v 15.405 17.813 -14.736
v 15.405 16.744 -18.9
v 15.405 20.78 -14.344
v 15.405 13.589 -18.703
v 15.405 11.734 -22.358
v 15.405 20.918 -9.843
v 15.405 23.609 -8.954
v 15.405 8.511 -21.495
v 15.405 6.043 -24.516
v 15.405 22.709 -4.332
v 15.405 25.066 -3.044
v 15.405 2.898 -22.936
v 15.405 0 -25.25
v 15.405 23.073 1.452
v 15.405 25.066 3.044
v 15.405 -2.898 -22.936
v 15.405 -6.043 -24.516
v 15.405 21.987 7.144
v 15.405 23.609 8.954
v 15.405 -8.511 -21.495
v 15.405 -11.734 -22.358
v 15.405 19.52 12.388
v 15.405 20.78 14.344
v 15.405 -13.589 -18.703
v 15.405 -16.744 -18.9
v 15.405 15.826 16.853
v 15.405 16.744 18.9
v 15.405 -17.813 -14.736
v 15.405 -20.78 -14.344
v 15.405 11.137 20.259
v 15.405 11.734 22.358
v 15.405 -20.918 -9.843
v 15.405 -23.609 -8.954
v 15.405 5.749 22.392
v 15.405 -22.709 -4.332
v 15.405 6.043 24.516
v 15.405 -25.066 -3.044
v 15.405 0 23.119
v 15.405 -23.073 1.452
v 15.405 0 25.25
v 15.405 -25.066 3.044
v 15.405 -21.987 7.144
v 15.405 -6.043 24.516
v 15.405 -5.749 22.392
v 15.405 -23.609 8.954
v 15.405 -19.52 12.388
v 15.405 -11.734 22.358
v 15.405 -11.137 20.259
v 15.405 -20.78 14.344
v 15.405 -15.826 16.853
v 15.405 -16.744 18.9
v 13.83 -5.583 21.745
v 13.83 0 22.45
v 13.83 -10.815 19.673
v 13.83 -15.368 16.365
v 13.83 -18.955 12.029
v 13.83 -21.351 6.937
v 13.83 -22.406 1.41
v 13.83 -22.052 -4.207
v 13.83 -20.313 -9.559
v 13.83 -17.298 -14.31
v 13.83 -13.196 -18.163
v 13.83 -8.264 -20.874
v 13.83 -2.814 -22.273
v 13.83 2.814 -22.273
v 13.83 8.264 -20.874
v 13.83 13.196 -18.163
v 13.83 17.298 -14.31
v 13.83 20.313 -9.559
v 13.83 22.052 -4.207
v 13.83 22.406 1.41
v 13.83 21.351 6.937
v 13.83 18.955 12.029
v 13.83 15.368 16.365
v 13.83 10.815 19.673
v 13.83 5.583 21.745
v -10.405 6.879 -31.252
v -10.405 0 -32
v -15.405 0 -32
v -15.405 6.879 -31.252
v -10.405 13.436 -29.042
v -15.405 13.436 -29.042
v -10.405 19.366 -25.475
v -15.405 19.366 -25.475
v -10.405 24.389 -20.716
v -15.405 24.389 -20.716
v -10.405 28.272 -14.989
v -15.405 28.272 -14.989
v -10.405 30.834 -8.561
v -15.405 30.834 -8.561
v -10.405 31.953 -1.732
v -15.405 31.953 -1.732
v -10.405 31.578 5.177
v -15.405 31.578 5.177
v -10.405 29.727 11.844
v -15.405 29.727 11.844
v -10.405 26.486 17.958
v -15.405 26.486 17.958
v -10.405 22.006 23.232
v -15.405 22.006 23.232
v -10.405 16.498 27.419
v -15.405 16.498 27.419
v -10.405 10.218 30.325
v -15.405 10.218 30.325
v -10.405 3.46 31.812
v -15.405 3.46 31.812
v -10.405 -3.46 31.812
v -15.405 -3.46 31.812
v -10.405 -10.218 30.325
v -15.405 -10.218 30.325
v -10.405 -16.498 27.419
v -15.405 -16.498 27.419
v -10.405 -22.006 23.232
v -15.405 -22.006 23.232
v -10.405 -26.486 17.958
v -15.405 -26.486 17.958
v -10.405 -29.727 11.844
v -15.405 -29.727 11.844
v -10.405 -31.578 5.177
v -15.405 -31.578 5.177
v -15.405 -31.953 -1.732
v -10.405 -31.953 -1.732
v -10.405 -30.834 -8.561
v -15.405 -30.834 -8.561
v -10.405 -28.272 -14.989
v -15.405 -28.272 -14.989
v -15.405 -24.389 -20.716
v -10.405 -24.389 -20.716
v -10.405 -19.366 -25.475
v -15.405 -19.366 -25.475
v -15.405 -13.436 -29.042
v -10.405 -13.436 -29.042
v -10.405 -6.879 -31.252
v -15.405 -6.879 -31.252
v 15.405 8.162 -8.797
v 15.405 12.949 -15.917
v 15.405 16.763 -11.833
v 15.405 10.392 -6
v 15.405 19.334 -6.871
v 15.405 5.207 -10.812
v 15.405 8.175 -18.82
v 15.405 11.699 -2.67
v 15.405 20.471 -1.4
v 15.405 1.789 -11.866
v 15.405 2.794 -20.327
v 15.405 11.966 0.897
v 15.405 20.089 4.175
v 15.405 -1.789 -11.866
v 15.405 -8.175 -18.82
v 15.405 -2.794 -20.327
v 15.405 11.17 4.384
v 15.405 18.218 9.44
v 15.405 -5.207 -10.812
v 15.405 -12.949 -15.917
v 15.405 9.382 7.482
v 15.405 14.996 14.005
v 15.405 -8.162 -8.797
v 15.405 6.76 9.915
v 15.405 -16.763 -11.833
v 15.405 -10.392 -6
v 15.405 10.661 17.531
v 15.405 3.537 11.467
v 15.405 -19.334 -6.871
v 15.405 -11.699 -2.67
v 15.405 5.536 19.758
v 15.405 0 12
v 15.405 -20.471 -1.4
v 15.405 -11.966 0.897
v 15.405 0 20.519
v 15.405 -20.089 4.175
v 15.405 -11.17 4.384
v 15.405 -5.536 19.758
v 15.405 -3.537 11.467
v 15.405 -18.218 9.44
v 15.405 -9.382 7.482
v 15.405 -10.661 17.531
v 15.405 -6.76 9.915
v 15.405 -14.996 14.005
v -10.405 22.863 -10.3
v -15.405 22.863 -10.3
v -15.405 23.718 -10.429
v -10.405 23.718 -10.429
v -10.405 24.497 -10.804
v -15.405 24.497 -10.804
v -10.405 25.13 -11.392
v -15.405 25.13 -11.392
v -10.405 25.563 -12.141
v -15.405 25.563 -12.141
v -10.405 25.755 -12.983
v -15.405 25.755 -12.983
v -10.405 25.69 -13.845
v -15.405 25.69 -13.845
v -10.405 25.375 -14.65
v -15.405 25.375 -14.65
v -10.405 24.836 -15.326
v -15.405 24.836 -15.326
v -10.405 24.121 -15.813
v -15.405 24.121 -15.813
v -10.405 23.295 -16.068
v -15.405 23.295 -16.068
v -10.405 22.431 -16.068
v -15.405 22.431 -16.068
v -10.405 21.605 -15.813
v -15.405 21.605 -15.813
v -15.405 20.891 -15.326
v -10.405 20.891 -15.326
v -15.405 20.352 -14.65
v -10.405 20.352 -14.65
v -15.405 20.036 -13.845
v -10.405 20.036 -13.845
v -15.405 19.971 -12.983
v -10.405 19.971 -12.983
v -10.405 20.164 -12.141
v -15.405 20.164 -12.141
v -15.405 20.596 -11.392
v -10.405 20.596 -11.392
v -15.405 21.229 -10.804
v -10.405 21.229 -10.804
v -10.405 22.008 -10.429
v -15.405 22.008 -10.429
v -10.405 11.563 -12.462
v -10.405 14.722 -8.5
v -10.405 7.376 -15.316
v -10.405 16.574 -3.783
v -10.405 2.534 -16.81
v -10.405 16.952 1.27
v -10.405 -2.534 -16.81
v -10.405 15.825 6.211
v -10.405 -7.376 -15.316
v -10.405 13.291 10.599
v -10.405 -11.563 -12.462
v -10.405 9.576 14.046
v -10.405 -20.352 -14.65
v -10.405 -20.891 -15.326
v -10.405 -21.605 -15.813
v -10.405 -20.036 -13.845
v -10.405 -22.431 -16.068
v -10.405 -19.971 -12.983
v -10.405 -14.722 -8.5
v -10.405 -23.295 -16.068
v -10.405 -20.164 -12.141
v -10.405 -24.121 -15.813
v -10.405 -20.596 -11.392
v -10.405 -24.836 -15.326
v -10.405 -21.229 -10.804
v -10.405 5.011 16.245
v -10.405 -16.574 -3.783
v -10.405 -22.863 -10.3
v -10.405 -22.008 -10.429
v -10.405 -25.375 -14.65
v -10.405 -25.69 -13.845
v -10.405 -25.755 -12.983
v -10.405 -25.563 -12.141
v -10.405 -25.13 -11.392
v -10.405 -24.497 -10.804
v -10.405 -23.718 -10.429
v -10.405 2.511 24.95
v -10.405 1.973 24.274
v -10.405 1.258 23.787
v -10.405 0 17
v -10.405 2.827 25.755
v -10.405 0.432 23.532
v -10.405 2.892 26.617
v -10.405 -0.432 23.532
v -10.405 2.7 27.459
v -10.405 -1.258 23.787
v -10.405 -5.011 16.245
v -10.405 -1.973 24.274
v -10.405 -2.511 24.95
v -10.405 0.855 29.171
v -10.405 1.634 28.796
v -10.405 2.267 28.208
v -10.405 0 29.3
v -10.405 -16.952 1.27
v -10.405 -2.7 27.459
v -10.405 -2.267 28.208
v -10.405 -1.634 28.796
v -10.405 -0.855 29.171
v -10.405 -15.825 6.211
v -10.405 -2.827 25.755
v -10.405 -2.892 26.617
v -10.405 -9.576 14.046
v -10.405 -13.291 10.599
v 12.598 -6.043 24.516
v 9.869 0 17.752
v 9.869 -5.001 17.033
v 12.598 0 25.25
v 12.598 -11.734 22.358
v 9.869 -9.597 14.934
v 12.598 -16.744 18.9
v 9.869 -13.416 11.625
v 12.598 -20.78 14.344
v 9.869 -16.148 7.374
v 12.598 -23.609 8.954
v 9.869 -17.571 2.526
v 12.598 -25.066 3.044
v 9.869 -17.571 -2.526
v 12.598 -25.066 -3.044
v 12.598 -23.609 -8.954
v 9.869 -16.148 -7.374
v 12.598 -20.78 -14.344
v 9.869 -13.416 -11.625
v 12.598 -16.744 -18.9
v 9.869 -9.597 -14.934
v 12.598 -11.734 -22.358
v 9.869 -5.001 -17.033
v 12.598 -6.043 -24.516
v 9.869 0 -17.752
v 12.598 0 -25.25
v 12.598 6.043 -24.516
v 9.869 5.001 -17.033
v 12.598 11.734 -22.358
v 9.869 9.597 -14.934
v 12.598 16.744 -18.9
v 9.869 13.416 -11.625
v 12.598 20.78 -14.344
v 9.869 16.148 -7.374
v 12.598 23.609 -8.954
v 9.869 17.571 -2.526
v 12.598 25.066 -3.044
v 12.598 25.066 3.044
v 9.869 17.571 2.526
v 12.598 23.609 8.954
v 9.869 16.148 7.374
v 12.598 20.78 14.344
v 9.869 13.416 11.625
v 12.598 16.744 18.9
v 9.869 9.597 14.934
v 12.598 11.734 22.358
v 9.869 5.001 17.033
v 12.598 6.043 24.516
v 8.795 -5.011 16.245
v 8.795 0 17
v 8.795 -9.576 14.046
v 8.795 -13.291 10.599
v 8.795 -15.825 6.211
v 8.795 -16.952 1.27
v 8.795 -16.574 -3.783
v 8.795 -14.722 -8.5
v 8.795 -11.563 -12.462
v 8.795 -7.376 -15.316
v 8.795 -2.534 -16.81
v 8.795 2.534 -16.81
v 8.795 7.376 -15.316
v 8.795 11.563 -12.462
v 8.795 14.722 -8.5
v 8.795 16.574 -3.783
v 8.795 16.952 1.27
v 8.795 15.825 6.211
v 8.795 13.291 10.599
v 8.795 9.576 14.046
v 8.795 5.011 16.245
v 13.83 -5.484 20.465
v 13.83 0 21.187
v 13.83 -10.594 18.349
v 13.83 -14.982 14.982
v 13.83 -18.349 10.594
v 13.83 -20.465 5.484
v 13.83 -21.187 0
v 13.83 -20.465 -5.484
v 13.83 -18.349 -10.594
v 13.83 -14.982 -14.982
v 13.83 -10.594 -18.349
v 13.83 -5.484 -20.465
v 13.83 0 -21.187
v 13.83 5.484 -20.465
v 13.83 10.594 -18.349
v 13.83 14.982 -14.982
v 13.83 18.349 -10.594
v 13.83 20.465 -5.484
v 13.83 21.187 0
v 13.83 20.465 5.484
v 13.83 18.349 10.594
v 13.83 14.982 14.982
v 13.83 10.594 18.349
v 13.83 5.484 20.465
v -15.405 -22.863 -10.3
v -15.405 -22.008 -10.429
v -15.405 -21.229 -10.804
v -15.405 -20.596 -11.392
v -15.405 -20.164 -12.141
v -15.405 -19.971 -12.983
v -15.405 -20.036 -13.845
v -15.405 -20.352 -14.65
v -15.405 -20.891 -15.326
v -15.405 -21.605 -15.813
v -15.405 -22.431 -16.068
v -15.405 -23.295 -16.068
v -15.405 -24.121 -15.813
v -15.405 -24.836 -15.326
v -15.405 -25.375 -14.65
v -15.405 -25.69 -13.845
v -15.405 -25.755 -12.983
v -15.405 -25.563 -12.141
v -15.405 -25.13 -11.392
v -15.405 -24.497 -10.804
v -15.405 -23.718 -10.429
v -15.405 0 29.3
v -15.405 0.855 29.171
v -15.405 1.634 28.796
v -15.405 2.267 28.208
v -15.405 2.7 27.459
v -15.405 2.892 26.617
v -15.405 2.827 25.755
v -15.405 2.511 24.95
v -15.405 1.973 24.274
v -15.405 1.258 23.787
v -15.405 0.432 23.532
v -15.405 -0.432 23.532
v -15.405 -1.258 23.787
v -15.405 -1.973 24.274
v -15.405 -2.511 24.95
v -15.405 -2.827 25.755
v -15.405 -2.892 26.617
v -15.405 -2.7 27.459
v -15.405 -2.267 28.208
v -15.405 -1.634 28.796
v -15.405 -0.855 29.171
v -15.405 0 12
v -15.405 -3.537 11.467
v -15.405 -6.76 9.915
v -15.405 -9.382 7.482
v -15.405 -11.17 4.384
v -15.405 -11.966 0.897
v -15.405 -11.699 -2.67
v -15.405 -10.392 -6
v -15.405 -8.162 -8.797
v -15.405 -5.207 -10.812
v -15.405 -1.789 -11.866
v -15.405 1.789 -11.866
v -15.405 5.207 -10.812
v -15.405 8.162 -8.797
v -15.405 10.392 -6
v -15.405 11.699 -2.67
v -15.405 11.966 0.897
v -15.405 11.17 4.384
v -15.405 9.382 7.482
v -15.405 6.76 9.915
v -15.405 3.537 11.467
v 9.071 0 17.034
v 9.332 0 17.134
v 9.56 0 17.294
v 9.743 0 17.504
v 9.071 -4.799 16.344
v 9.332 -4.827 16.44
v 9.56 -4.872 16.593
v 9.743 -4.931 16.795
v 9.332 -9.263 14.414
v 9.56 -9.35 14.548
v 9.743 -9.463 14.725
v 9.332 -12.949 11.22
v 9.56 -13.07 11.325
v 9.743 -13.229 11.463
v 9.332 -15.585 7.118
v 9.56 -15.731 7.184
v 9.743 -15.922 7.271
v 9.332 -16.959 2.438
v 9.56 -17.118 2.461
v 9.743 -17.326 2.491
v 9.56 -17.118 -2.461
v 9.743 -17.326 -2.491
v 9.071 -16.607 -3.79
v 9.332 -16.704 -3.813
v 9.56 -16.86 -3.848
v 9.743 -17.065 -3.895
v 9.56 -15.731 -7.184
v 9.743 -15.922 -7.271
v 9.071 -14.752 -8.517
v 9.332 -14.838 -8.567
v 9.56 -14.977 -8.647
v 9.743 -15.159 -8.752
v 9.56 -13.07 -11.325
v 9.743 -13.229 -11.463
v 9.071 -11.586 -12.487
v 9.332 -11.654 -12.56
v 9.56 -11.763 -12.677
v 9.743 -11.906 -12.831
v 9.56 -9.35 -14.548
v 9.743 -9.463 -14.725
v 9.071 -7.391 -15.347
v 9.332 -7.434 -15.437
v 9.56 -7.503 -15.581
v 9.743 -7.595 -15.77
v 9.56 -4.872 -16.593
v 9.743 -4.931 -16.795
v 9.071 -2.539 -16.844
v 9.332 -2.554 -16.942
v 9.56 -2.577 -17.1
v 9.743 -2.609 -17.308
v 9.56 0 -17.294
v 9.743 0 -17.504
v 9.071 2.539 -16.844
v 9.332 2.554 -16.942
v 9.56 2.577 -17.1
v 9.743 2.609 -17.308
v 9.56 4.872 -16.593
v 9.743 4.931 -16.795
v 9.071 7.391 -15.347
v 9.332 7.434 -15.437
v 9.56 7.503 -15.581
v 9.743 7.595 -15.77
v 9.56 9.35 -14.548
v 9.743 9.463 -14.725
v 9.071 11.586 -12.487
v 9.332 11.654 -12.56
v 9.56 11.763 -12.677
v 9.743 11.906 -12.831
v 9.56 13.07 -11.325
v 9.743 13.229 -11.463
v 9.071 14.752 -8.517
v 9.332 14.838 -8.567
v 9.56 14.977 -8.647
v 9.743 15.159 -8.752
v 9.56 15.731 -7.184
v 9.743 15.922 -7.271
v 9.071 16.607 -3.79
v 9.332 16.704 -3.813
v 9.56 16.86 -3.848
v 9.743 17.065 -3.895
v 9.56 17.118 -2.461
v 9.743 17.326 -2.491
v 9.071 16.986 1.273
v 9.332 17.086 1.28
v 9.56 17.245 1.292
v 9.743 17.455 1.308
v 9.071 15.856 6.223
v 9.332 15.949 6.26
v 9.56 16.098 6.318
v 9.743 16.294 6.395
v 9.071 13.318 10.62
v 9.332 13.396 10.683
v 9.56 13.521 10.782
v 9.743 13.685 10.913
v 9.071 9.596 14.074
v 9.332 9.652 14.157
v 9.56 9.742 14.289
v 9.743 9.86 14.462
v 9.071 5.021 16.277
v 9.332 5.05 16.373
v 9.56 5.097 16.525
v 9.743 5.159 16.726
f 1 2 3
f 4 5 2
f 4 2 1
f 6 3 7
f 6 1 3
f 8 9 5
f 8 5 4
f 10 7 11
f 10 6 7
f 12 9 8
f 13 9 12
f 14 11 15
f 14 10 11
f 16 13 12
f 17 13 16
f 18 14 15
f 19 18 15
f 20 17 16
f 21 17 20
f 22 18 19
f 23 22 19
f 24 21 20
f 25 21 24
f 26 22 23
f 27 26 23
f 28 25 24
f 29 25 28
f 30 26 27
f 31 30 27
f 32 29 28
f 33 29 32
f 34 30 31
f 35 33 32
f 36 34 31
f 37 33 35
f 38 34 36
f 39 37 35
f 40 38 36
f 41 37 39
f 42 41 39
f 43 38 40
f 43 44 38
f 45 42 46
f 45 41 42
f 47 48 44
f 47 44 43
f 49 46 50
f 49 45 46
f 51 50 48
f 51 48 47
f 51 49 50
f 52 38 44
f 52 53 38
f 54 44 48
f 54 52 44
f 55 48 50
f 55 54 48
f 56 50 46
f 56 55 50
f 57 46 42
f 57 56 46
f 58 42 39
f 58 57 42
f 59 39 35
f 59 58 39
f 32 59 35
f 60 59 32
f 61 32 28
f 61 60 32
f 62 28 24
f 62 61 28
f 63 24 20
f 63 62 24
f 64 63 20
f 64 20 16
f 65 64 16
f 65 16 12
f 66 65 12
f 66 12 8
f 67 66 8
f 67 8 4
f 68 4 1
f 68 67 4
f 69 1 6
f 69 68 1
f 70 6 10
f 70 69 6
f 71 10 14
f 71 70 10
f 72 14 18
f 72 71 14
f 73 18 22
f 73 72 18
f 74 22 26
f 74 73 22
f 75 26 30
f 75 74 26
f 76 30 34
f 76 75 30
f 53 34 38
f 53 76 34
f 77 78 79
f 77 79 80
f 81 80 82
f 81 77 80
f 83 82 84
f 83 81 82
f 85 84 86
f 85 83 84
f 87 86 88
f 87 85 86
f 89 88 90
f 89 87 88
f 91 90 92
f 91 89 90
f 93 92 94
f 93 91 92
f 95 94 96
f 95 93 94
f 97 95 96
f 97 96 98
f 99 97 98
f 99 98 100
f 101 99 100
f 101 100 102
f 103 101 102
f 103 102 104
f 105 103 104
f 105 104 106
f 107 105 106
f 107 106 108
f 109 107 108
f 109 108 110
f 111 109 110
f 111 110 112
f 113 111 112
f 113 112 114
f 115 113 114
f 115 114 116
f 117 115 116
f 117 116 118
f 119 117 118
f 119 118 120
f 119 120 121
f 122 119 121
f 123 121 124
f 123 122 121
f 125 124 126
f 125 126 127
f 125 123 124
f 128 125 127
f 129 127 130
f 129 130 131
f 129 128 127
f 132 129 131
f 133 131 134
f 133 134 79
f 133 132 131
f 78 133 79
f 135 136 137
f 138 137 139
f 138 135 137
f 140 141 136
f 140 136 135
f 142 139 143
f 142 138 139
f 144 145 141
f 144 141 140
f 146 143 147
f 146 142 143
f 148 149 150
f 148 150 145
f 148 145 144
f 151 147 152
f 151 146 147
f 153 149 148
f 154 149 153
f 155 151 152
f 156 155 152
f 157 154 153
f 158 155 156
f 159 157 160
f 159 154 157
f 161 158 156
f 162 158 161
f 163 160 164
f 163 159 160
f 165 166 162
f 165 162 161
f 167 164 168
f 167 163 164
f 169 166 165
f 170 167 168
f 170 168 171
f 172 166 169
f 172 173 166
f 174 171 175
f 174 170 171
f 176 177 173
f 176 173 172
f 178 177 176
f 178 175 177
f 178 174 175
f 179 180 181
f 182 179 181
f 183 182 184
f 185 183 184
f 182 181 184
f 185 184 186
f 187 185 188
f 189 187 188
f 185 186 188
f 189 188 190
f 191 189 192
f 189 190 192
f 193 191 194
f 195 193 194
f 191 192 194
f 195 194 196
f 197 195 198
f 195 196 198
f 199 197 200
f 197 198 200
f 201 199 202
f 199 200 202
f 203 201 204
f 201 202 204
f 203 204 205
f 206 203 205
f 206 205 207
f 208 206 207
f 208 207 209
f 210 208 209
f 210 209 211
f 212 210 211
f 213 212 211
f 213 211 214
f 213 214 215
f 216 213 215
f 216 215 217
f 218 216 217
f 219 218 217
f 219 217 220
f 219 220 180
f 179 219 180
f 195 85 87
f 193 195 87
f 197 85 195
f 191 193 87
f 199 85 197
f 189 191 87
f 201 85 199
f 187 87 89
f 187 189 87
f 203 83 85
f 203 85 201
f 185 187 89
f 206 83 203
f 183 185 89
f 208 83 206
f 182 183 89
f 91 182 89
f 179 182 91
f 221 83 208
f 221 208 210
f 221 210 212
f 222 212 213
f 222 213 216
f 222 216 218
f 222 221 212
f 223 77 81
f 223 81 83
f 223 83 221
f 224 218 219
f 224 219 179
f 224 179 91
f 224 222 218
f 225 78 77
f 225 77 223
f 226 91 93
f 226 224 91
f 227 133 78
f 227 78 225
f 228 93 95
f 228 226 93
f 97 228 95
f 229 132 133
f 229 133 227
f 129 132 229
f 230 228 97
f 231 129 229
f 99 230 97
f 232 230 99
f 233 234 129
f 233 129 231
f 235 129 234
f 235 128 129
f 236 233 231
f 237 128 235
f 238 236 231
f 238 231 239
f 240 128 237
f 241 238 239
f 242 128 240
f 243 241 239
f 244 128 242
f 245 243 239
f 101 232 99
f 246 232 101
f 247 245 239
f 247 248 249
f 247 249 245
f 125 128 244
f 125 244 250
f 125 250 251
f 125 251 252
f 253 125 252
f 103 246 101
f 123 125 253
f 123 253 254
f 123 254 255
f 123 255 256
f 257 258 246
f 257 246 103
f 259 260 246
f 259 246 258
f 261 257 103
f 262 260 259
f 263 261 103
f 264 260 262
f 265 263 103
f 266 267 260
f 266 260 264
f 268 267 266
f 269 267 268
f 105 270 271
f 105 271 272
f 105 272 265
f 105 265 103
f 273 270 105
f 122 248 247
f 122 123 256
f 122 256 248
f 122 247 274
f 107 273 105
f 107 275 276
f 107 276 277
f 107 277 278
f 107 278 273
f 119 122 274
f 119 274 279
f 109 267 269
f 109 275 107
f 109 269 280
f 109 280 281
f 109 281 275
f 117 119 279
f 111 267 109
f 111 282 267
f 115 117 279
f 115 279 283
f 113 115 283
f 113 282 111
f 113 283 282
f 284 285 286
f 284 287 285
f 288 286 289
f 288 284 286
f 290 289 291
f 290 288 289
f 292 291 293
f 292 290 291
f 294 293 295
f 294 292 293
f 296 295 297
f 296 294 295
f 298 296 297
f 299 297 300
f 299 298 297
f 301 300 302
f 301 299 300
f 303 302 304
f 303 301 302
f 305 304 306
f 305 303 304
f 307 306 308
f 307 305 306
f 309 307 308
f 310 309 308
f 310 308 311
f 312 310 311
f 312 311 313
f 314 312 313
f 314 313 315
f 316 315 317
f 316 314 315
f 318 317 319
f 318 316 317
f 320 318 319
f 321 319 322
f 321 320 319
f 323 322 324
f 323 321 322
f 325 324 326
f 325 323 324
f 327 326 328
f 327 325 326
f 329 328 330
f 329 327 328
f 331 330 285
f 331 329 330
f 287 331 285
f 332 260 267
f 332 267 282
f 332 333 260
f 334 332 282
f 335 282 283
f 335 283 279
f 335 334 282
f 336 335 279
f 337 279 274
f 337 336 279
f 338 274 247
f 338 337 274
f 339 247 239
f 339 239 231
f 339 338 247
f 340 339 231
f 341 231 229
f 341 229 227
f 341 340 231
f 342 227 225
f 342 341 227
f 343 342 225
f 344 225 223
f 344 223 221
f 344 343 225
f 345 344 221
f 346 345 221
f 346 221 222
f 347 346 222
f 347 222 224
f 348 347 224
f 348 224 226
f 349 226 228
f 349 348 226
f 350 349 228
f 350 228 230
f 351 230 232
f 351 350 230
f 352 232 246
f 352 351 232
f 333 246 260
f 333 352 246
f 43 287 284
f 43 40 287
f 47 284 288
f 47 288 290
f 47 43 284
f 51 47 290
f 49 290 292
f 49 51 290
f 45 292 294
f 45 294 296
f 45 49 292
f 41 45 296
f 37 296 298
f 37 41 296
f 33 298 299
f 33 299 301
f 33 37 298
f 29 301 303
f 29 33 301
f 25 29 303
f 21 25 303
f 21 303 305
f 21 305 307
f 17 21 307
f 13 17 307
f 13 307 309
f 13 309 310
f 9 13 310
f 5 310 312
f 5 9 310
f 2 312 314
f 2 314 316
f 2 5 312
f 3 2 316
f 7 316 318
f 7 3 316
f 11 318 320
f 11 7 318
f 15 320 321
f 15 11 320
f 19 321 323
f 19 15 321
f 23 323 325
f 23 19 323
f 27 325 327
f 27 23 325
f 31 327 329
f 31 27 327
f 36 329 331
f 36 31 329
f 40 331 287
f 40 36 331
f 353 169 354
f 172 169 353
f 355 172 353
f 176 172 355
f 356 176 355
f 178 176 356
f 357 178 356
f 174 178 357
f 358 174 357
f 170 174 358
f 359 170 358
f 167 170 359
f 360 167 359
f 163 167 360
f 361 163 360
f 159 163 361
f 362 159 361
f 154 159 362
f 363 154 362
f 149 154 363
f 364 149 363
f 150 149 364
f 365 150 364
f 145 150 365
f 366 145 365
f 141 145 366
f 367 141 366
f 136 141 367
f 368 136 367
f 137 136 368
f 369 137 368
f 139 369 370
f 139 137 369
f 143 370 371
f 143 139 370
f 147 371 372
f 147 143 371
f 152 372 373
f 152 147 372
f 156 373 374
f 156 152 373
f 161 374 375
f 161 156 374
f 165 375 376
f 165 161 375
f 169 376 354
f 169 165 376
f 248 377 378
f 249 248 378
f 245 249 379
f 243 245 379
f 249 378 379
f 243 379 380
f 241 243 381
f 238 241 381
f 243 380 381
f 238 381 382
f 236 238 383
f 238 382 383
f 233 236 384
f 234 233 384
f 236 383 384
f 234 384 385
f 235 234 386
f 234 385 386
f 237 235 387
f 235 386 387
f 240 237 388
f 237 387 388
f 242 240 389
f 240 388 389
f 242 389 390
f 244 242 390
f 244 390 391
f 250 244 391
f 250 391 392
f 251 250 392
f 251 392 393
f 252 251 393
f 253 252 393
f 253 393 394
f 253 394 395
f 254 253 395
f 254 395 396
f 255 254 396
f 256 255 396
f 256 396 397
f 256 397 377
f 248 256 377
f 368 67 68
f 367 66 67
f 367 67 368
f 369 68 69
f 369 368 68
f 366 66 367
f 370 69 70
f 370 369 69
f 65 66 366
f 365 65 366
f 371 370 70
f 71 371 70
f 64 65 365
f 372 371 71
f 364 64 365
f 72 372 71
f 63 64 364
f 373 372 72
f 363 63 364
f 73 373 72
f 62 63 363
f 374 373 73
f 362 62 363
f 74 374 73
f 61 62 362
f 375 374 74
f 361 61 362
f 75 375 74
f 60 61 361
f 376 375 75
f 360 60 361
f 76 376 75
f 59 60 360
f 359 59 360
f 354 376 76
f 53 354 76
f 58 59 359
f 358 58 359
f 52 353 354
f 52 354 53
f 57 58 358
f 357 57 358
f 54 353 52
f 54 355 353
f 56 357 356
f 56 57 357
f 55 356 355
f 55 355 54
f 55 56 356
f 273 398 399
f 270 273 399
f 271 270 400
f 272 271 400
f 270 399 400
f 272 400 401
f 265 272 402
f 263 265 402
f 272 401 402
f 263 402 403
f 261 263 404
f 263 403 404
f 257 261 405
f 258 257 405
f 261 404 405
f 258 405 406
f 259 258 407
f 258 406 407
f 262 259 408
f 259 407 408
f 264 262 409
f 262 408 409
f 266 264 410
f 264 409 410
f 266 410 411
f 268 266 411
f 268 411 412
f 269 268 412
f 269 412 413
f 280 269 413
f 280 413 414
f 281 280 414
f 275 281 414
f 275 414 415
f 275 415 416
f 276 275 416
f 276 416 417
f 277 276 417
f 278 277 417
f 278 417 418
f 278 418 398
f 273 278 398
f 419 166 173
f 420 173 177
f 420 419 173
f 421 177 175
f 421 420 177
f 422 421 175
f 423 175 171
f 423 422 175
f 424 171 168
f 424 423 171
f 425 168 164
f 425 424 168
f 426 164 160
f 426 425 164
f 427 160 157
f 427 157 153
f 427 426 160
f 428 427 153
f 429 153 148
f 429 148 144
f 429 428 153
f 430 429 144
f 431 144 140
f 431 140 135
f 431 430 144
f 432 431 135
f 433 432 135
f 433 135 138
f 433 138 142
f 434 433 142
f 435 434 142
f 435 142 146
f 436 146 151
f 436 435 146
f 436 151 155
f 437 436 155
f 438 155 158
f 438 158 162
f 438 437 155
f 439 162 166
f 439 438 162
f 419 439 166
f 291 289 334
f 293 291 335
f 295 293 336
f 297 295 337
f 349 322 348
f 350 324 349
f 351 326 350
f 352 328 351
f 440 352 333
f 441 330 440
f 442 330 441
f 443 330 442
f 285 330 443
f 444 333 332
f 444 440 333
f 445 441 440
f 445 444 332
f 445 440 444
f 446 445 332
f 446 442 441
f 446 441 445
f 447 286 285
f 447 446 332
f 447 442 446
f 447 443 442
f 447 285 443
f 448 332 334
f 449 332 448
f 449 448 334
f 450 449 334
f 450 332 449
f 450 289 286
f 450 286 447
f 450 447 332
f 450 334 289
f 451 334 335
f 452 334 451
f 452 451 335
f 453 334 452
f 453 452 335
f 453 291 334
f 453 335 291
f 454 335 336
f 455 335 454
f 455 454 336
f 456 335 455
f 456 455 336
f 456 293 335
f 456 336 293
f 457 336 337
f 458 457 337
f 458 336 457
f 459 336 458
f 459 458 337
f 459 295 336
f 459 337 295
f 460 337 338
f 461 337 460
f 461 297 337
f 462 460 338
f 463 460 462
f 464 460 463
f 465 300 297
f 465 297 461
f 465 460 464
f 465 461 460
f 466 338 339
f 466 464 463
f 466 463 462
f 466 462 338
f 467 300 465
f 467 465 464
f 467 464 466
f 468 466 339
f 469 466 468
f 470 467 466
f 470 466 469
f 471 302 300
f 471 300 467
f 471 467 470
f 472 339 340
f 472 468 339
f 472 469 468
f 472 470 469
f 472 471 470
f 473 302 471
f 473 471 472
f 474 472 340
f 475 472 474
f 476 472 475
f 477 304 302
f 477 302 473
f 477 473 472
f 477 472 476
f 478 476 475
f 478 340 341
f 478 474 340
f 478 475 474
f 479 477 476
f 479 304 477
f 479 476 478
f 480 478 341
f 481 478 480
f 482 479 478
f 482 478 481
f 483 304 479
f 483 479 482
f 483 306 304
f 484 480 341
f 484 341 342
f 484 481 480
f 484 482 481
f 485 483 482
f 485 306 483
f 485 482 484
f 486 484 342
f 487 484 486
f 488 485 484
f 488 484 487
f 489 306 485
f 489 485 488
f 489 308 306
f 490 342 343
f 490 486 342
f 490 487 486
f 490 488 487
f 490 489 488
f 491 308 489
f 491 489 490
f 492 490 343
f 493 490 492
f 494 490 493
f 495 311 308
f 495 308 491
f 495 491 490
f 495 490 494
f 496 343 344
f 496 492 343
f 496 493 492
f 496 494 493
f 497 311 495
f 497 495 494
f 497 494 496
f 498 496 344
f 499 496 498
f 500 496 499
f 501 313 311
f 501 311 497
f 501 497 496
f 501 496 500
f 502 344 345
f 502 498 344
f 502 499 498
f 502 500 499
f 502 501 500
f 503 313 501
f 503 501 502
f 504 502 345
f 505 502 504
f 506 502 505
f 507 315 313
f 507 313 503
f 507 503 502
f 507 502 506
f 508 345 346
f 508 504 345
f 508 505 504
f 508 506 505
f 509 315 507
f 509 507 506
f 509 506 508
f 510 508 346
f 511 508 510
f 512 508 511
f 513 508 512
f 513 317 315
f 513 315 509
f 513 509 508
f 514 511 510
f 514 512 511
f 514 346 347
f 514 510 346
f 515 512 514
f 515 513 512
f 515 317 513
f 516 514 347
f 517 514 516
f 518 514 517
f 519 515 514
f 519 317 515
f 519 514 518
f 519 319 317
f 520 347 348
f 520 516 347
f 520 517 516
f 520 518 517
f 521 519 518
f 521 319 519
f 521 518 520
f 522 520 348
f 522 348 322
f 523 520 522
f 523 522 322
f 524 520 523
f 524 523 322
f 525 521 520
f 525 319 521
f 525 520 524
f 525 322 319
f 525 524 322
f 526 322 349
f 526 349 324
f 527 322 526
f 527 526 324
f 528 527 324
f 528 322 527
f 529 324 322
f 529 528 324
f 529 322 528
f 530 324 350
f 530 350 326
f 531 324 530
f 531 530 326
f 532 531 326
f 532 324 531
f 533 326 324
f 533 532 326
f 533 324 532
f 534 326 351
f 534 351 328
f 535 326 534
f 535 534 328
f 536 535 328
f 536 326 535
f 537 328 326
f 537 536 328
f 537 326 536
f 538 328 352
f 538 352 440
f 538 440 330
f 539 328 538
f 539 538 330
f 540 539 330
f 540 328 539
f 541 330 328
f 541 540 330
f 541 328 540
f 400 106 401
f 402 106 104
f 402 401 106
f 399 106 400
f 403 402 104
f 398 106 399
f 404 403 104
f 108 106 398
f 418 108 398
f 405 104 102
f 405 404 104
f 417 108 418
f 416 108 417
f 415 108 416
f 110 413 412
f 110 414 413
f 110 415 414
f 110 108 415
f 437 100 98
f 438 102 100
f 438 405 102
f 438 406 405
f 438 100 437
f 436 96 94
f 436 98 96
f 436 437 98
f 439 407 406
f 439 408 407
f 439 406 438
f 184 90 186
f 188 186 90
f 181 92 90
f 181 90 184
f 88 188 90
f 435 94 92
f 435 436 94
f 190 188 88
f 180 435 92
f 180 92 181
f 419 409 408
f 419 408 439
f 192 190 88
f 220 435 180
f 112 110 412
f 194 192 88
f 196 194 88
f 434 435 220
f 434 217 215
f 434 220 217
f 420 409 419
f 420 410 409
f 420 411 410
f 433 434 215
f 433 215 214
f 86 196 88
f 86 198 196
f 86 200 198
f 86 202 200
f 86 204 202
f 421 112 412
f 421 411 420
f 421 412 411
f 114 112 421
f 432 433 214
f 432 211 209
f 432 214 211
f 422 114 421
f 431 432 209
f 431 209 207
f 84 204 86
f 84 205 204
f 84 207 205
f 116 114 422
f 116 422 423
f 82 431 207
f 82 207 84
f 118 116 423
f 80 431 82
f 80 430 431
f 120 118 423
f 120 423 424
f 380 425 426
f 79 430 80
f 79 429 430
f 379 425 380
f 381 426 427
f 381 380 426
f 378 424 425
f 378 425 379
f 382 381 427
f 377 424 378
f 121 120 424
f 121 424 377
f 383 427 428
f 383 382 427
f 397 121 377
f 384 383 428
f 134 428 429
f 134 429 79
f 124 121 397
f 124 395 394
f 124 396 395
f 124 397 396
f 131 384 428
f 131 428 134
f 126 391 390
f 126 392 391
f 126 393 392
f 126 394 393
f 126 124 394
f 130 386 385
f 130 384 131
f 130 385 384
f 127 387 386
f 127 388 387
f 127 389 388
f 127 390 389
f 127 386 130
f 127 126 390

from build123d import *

# Parameters (mm, degrees)
M5_CLEARANCE_HOLE1_REACH  = 59.107
M5_CLEARANCE_HOLE1_BORE_R = 2.9
SKETCH5_R                 = 42
SKETCH5_R_2               = 32
CUT_EXTRUDE_THIN1_DEPTH   = 55.572226802


with BuildPart() as part:
    # Sketch1 → Revolve1 (revolve)
    with BuildSketch(Plane.XY, mode=Mode.PRIVATE) as revolve1_sk:
        with BuildLine():
            Line((-15.404727216, 12), (-15.404727216, 34))
            Line((-15.404727216, 34), (-10.404727216, 34))
            Line((-10.404727216, 34), (-10.404727216, 17))
            Line((-10.404727216, 17), (8.794935567, 17))
            ThreePointArc((8.794935567, 17), (9.450533434, 17.206709213), (9.869004233, 17.752070976))
            Line((9.869004233, 17.752070976), (12.598027216, 25.25))
            Line((12.598027216, 25.25), (15.404727216, 25.25))
            Line((15.404727216, 25.25), (15.404727216, 23.1186))
            Line((15.404727216, 23.1186), (13.829927216, 22.450137059))
            Line((13.829927216, 22.450137059), (13.829927216, 21.187062941))
            Line((13.829927216, 21.187062941), (15.404727216, 20.5186))
            Line((15.404727216, 20.5186), (15.404727216, 12))
            Line((15.404727216, 12), (-15.404727216, 12))
        make_face()
    revolve(revolve1_sk.sketch.rotate(Axis((0, 0, 0), (1, 0, 0)), 90), axis=Axis((0, 0, 0), (1, 0, 0)))

    # M5 Clearance Hole1 bore → M5 Clearance Hole1 (cut, up to next)
    with BuildSketch(Plane.ZY.offset(15.404727216), mode=Mode.PRIVATE) as m5_clearance_hole1_sk1:
        with Locations((-13.199999999, -22.86307066)):
            Circle(M5_CLEARANCE_HOLE1_BORE_R)
    m5_clearance_hole1_tool1 = extrude(m5_clearance_hole1_sk1.sketch, amount=-M5_CLEARANCE_HOLE1_REACH, mode=Mode.PRIVATE) & part.part
    # M5 Clearance Hole1 bore → M5 Clearance Hole1 (cut, up to next)
    with BuildSketch(Plane.ZY.offset(15.404727216), mode=Mode.PRIVATE) as m5_clearance_hole1_sk2:
        with Locations((-13.200000001, 22.863070659)):
            Circle(M5_CLEARANCE_HOLE1_BORE_R)
    m5_clearance_hole1_tool2 = extrude(m5_clearance_hole1_sk2.sketch, amount=-M5_CLEARANCE_HOLE1_REACH, mode=Mode.PRIVATE) & part.part
    # M5 Clearance Hole1 bore → M5 Clearance Hole1 (cut, up to next)
    with BuildSketch(Plane.ZY.offset(15.404727216), mode=Mode.PRIVATE) as m5_clearance_hole1_sk3:
        with Locations((26.4, 1e-09)):
            Circle(M5_CLEARANCE_HOLE1_BORE_R)
    m5_clearance_hole1_tool3 = extrude(m5_clearance_hole1_sk3.sketch, amount=-M5_CLEARANCE_HOLE1_REACH, mode=Mode.PRIVATE) & part.part
    add(m5_clearance_hole1_tool1.solids().sort_by_distance((-15.404727, -22.863071, -13.2))[0], mode=Mode.SUBTRACT)
    add(m5_clearance_hole1_tool2.solids().sort_by_distance((-15.404727, 22.863071, -13.2))[0], mode=Mode.SUBTRACT)
    add(m5_clearance_hole1_tool3.solids().sort_by_distance((-15.404727, 0, 26.4))[0], mode=Mode.SUBTRACT)

    # Sketch5 → Cut-Extrude-Thin1 (cut, through all)
    with BuildSketch(Plane(origin=(-10.404727216, 0, 0), x_dir=(0, 0, -1), z_dir=(1, 0, 0))):
        Circle(SKETCH5_R)
        Circle(SKETCH5_R_2, mode=Mode.SUBTRACT)
    extrude(amount=-CUT_EXTRUDE_THIN1_DEPTH, mode=Mode.SUBTRACT)


solid = part.part
